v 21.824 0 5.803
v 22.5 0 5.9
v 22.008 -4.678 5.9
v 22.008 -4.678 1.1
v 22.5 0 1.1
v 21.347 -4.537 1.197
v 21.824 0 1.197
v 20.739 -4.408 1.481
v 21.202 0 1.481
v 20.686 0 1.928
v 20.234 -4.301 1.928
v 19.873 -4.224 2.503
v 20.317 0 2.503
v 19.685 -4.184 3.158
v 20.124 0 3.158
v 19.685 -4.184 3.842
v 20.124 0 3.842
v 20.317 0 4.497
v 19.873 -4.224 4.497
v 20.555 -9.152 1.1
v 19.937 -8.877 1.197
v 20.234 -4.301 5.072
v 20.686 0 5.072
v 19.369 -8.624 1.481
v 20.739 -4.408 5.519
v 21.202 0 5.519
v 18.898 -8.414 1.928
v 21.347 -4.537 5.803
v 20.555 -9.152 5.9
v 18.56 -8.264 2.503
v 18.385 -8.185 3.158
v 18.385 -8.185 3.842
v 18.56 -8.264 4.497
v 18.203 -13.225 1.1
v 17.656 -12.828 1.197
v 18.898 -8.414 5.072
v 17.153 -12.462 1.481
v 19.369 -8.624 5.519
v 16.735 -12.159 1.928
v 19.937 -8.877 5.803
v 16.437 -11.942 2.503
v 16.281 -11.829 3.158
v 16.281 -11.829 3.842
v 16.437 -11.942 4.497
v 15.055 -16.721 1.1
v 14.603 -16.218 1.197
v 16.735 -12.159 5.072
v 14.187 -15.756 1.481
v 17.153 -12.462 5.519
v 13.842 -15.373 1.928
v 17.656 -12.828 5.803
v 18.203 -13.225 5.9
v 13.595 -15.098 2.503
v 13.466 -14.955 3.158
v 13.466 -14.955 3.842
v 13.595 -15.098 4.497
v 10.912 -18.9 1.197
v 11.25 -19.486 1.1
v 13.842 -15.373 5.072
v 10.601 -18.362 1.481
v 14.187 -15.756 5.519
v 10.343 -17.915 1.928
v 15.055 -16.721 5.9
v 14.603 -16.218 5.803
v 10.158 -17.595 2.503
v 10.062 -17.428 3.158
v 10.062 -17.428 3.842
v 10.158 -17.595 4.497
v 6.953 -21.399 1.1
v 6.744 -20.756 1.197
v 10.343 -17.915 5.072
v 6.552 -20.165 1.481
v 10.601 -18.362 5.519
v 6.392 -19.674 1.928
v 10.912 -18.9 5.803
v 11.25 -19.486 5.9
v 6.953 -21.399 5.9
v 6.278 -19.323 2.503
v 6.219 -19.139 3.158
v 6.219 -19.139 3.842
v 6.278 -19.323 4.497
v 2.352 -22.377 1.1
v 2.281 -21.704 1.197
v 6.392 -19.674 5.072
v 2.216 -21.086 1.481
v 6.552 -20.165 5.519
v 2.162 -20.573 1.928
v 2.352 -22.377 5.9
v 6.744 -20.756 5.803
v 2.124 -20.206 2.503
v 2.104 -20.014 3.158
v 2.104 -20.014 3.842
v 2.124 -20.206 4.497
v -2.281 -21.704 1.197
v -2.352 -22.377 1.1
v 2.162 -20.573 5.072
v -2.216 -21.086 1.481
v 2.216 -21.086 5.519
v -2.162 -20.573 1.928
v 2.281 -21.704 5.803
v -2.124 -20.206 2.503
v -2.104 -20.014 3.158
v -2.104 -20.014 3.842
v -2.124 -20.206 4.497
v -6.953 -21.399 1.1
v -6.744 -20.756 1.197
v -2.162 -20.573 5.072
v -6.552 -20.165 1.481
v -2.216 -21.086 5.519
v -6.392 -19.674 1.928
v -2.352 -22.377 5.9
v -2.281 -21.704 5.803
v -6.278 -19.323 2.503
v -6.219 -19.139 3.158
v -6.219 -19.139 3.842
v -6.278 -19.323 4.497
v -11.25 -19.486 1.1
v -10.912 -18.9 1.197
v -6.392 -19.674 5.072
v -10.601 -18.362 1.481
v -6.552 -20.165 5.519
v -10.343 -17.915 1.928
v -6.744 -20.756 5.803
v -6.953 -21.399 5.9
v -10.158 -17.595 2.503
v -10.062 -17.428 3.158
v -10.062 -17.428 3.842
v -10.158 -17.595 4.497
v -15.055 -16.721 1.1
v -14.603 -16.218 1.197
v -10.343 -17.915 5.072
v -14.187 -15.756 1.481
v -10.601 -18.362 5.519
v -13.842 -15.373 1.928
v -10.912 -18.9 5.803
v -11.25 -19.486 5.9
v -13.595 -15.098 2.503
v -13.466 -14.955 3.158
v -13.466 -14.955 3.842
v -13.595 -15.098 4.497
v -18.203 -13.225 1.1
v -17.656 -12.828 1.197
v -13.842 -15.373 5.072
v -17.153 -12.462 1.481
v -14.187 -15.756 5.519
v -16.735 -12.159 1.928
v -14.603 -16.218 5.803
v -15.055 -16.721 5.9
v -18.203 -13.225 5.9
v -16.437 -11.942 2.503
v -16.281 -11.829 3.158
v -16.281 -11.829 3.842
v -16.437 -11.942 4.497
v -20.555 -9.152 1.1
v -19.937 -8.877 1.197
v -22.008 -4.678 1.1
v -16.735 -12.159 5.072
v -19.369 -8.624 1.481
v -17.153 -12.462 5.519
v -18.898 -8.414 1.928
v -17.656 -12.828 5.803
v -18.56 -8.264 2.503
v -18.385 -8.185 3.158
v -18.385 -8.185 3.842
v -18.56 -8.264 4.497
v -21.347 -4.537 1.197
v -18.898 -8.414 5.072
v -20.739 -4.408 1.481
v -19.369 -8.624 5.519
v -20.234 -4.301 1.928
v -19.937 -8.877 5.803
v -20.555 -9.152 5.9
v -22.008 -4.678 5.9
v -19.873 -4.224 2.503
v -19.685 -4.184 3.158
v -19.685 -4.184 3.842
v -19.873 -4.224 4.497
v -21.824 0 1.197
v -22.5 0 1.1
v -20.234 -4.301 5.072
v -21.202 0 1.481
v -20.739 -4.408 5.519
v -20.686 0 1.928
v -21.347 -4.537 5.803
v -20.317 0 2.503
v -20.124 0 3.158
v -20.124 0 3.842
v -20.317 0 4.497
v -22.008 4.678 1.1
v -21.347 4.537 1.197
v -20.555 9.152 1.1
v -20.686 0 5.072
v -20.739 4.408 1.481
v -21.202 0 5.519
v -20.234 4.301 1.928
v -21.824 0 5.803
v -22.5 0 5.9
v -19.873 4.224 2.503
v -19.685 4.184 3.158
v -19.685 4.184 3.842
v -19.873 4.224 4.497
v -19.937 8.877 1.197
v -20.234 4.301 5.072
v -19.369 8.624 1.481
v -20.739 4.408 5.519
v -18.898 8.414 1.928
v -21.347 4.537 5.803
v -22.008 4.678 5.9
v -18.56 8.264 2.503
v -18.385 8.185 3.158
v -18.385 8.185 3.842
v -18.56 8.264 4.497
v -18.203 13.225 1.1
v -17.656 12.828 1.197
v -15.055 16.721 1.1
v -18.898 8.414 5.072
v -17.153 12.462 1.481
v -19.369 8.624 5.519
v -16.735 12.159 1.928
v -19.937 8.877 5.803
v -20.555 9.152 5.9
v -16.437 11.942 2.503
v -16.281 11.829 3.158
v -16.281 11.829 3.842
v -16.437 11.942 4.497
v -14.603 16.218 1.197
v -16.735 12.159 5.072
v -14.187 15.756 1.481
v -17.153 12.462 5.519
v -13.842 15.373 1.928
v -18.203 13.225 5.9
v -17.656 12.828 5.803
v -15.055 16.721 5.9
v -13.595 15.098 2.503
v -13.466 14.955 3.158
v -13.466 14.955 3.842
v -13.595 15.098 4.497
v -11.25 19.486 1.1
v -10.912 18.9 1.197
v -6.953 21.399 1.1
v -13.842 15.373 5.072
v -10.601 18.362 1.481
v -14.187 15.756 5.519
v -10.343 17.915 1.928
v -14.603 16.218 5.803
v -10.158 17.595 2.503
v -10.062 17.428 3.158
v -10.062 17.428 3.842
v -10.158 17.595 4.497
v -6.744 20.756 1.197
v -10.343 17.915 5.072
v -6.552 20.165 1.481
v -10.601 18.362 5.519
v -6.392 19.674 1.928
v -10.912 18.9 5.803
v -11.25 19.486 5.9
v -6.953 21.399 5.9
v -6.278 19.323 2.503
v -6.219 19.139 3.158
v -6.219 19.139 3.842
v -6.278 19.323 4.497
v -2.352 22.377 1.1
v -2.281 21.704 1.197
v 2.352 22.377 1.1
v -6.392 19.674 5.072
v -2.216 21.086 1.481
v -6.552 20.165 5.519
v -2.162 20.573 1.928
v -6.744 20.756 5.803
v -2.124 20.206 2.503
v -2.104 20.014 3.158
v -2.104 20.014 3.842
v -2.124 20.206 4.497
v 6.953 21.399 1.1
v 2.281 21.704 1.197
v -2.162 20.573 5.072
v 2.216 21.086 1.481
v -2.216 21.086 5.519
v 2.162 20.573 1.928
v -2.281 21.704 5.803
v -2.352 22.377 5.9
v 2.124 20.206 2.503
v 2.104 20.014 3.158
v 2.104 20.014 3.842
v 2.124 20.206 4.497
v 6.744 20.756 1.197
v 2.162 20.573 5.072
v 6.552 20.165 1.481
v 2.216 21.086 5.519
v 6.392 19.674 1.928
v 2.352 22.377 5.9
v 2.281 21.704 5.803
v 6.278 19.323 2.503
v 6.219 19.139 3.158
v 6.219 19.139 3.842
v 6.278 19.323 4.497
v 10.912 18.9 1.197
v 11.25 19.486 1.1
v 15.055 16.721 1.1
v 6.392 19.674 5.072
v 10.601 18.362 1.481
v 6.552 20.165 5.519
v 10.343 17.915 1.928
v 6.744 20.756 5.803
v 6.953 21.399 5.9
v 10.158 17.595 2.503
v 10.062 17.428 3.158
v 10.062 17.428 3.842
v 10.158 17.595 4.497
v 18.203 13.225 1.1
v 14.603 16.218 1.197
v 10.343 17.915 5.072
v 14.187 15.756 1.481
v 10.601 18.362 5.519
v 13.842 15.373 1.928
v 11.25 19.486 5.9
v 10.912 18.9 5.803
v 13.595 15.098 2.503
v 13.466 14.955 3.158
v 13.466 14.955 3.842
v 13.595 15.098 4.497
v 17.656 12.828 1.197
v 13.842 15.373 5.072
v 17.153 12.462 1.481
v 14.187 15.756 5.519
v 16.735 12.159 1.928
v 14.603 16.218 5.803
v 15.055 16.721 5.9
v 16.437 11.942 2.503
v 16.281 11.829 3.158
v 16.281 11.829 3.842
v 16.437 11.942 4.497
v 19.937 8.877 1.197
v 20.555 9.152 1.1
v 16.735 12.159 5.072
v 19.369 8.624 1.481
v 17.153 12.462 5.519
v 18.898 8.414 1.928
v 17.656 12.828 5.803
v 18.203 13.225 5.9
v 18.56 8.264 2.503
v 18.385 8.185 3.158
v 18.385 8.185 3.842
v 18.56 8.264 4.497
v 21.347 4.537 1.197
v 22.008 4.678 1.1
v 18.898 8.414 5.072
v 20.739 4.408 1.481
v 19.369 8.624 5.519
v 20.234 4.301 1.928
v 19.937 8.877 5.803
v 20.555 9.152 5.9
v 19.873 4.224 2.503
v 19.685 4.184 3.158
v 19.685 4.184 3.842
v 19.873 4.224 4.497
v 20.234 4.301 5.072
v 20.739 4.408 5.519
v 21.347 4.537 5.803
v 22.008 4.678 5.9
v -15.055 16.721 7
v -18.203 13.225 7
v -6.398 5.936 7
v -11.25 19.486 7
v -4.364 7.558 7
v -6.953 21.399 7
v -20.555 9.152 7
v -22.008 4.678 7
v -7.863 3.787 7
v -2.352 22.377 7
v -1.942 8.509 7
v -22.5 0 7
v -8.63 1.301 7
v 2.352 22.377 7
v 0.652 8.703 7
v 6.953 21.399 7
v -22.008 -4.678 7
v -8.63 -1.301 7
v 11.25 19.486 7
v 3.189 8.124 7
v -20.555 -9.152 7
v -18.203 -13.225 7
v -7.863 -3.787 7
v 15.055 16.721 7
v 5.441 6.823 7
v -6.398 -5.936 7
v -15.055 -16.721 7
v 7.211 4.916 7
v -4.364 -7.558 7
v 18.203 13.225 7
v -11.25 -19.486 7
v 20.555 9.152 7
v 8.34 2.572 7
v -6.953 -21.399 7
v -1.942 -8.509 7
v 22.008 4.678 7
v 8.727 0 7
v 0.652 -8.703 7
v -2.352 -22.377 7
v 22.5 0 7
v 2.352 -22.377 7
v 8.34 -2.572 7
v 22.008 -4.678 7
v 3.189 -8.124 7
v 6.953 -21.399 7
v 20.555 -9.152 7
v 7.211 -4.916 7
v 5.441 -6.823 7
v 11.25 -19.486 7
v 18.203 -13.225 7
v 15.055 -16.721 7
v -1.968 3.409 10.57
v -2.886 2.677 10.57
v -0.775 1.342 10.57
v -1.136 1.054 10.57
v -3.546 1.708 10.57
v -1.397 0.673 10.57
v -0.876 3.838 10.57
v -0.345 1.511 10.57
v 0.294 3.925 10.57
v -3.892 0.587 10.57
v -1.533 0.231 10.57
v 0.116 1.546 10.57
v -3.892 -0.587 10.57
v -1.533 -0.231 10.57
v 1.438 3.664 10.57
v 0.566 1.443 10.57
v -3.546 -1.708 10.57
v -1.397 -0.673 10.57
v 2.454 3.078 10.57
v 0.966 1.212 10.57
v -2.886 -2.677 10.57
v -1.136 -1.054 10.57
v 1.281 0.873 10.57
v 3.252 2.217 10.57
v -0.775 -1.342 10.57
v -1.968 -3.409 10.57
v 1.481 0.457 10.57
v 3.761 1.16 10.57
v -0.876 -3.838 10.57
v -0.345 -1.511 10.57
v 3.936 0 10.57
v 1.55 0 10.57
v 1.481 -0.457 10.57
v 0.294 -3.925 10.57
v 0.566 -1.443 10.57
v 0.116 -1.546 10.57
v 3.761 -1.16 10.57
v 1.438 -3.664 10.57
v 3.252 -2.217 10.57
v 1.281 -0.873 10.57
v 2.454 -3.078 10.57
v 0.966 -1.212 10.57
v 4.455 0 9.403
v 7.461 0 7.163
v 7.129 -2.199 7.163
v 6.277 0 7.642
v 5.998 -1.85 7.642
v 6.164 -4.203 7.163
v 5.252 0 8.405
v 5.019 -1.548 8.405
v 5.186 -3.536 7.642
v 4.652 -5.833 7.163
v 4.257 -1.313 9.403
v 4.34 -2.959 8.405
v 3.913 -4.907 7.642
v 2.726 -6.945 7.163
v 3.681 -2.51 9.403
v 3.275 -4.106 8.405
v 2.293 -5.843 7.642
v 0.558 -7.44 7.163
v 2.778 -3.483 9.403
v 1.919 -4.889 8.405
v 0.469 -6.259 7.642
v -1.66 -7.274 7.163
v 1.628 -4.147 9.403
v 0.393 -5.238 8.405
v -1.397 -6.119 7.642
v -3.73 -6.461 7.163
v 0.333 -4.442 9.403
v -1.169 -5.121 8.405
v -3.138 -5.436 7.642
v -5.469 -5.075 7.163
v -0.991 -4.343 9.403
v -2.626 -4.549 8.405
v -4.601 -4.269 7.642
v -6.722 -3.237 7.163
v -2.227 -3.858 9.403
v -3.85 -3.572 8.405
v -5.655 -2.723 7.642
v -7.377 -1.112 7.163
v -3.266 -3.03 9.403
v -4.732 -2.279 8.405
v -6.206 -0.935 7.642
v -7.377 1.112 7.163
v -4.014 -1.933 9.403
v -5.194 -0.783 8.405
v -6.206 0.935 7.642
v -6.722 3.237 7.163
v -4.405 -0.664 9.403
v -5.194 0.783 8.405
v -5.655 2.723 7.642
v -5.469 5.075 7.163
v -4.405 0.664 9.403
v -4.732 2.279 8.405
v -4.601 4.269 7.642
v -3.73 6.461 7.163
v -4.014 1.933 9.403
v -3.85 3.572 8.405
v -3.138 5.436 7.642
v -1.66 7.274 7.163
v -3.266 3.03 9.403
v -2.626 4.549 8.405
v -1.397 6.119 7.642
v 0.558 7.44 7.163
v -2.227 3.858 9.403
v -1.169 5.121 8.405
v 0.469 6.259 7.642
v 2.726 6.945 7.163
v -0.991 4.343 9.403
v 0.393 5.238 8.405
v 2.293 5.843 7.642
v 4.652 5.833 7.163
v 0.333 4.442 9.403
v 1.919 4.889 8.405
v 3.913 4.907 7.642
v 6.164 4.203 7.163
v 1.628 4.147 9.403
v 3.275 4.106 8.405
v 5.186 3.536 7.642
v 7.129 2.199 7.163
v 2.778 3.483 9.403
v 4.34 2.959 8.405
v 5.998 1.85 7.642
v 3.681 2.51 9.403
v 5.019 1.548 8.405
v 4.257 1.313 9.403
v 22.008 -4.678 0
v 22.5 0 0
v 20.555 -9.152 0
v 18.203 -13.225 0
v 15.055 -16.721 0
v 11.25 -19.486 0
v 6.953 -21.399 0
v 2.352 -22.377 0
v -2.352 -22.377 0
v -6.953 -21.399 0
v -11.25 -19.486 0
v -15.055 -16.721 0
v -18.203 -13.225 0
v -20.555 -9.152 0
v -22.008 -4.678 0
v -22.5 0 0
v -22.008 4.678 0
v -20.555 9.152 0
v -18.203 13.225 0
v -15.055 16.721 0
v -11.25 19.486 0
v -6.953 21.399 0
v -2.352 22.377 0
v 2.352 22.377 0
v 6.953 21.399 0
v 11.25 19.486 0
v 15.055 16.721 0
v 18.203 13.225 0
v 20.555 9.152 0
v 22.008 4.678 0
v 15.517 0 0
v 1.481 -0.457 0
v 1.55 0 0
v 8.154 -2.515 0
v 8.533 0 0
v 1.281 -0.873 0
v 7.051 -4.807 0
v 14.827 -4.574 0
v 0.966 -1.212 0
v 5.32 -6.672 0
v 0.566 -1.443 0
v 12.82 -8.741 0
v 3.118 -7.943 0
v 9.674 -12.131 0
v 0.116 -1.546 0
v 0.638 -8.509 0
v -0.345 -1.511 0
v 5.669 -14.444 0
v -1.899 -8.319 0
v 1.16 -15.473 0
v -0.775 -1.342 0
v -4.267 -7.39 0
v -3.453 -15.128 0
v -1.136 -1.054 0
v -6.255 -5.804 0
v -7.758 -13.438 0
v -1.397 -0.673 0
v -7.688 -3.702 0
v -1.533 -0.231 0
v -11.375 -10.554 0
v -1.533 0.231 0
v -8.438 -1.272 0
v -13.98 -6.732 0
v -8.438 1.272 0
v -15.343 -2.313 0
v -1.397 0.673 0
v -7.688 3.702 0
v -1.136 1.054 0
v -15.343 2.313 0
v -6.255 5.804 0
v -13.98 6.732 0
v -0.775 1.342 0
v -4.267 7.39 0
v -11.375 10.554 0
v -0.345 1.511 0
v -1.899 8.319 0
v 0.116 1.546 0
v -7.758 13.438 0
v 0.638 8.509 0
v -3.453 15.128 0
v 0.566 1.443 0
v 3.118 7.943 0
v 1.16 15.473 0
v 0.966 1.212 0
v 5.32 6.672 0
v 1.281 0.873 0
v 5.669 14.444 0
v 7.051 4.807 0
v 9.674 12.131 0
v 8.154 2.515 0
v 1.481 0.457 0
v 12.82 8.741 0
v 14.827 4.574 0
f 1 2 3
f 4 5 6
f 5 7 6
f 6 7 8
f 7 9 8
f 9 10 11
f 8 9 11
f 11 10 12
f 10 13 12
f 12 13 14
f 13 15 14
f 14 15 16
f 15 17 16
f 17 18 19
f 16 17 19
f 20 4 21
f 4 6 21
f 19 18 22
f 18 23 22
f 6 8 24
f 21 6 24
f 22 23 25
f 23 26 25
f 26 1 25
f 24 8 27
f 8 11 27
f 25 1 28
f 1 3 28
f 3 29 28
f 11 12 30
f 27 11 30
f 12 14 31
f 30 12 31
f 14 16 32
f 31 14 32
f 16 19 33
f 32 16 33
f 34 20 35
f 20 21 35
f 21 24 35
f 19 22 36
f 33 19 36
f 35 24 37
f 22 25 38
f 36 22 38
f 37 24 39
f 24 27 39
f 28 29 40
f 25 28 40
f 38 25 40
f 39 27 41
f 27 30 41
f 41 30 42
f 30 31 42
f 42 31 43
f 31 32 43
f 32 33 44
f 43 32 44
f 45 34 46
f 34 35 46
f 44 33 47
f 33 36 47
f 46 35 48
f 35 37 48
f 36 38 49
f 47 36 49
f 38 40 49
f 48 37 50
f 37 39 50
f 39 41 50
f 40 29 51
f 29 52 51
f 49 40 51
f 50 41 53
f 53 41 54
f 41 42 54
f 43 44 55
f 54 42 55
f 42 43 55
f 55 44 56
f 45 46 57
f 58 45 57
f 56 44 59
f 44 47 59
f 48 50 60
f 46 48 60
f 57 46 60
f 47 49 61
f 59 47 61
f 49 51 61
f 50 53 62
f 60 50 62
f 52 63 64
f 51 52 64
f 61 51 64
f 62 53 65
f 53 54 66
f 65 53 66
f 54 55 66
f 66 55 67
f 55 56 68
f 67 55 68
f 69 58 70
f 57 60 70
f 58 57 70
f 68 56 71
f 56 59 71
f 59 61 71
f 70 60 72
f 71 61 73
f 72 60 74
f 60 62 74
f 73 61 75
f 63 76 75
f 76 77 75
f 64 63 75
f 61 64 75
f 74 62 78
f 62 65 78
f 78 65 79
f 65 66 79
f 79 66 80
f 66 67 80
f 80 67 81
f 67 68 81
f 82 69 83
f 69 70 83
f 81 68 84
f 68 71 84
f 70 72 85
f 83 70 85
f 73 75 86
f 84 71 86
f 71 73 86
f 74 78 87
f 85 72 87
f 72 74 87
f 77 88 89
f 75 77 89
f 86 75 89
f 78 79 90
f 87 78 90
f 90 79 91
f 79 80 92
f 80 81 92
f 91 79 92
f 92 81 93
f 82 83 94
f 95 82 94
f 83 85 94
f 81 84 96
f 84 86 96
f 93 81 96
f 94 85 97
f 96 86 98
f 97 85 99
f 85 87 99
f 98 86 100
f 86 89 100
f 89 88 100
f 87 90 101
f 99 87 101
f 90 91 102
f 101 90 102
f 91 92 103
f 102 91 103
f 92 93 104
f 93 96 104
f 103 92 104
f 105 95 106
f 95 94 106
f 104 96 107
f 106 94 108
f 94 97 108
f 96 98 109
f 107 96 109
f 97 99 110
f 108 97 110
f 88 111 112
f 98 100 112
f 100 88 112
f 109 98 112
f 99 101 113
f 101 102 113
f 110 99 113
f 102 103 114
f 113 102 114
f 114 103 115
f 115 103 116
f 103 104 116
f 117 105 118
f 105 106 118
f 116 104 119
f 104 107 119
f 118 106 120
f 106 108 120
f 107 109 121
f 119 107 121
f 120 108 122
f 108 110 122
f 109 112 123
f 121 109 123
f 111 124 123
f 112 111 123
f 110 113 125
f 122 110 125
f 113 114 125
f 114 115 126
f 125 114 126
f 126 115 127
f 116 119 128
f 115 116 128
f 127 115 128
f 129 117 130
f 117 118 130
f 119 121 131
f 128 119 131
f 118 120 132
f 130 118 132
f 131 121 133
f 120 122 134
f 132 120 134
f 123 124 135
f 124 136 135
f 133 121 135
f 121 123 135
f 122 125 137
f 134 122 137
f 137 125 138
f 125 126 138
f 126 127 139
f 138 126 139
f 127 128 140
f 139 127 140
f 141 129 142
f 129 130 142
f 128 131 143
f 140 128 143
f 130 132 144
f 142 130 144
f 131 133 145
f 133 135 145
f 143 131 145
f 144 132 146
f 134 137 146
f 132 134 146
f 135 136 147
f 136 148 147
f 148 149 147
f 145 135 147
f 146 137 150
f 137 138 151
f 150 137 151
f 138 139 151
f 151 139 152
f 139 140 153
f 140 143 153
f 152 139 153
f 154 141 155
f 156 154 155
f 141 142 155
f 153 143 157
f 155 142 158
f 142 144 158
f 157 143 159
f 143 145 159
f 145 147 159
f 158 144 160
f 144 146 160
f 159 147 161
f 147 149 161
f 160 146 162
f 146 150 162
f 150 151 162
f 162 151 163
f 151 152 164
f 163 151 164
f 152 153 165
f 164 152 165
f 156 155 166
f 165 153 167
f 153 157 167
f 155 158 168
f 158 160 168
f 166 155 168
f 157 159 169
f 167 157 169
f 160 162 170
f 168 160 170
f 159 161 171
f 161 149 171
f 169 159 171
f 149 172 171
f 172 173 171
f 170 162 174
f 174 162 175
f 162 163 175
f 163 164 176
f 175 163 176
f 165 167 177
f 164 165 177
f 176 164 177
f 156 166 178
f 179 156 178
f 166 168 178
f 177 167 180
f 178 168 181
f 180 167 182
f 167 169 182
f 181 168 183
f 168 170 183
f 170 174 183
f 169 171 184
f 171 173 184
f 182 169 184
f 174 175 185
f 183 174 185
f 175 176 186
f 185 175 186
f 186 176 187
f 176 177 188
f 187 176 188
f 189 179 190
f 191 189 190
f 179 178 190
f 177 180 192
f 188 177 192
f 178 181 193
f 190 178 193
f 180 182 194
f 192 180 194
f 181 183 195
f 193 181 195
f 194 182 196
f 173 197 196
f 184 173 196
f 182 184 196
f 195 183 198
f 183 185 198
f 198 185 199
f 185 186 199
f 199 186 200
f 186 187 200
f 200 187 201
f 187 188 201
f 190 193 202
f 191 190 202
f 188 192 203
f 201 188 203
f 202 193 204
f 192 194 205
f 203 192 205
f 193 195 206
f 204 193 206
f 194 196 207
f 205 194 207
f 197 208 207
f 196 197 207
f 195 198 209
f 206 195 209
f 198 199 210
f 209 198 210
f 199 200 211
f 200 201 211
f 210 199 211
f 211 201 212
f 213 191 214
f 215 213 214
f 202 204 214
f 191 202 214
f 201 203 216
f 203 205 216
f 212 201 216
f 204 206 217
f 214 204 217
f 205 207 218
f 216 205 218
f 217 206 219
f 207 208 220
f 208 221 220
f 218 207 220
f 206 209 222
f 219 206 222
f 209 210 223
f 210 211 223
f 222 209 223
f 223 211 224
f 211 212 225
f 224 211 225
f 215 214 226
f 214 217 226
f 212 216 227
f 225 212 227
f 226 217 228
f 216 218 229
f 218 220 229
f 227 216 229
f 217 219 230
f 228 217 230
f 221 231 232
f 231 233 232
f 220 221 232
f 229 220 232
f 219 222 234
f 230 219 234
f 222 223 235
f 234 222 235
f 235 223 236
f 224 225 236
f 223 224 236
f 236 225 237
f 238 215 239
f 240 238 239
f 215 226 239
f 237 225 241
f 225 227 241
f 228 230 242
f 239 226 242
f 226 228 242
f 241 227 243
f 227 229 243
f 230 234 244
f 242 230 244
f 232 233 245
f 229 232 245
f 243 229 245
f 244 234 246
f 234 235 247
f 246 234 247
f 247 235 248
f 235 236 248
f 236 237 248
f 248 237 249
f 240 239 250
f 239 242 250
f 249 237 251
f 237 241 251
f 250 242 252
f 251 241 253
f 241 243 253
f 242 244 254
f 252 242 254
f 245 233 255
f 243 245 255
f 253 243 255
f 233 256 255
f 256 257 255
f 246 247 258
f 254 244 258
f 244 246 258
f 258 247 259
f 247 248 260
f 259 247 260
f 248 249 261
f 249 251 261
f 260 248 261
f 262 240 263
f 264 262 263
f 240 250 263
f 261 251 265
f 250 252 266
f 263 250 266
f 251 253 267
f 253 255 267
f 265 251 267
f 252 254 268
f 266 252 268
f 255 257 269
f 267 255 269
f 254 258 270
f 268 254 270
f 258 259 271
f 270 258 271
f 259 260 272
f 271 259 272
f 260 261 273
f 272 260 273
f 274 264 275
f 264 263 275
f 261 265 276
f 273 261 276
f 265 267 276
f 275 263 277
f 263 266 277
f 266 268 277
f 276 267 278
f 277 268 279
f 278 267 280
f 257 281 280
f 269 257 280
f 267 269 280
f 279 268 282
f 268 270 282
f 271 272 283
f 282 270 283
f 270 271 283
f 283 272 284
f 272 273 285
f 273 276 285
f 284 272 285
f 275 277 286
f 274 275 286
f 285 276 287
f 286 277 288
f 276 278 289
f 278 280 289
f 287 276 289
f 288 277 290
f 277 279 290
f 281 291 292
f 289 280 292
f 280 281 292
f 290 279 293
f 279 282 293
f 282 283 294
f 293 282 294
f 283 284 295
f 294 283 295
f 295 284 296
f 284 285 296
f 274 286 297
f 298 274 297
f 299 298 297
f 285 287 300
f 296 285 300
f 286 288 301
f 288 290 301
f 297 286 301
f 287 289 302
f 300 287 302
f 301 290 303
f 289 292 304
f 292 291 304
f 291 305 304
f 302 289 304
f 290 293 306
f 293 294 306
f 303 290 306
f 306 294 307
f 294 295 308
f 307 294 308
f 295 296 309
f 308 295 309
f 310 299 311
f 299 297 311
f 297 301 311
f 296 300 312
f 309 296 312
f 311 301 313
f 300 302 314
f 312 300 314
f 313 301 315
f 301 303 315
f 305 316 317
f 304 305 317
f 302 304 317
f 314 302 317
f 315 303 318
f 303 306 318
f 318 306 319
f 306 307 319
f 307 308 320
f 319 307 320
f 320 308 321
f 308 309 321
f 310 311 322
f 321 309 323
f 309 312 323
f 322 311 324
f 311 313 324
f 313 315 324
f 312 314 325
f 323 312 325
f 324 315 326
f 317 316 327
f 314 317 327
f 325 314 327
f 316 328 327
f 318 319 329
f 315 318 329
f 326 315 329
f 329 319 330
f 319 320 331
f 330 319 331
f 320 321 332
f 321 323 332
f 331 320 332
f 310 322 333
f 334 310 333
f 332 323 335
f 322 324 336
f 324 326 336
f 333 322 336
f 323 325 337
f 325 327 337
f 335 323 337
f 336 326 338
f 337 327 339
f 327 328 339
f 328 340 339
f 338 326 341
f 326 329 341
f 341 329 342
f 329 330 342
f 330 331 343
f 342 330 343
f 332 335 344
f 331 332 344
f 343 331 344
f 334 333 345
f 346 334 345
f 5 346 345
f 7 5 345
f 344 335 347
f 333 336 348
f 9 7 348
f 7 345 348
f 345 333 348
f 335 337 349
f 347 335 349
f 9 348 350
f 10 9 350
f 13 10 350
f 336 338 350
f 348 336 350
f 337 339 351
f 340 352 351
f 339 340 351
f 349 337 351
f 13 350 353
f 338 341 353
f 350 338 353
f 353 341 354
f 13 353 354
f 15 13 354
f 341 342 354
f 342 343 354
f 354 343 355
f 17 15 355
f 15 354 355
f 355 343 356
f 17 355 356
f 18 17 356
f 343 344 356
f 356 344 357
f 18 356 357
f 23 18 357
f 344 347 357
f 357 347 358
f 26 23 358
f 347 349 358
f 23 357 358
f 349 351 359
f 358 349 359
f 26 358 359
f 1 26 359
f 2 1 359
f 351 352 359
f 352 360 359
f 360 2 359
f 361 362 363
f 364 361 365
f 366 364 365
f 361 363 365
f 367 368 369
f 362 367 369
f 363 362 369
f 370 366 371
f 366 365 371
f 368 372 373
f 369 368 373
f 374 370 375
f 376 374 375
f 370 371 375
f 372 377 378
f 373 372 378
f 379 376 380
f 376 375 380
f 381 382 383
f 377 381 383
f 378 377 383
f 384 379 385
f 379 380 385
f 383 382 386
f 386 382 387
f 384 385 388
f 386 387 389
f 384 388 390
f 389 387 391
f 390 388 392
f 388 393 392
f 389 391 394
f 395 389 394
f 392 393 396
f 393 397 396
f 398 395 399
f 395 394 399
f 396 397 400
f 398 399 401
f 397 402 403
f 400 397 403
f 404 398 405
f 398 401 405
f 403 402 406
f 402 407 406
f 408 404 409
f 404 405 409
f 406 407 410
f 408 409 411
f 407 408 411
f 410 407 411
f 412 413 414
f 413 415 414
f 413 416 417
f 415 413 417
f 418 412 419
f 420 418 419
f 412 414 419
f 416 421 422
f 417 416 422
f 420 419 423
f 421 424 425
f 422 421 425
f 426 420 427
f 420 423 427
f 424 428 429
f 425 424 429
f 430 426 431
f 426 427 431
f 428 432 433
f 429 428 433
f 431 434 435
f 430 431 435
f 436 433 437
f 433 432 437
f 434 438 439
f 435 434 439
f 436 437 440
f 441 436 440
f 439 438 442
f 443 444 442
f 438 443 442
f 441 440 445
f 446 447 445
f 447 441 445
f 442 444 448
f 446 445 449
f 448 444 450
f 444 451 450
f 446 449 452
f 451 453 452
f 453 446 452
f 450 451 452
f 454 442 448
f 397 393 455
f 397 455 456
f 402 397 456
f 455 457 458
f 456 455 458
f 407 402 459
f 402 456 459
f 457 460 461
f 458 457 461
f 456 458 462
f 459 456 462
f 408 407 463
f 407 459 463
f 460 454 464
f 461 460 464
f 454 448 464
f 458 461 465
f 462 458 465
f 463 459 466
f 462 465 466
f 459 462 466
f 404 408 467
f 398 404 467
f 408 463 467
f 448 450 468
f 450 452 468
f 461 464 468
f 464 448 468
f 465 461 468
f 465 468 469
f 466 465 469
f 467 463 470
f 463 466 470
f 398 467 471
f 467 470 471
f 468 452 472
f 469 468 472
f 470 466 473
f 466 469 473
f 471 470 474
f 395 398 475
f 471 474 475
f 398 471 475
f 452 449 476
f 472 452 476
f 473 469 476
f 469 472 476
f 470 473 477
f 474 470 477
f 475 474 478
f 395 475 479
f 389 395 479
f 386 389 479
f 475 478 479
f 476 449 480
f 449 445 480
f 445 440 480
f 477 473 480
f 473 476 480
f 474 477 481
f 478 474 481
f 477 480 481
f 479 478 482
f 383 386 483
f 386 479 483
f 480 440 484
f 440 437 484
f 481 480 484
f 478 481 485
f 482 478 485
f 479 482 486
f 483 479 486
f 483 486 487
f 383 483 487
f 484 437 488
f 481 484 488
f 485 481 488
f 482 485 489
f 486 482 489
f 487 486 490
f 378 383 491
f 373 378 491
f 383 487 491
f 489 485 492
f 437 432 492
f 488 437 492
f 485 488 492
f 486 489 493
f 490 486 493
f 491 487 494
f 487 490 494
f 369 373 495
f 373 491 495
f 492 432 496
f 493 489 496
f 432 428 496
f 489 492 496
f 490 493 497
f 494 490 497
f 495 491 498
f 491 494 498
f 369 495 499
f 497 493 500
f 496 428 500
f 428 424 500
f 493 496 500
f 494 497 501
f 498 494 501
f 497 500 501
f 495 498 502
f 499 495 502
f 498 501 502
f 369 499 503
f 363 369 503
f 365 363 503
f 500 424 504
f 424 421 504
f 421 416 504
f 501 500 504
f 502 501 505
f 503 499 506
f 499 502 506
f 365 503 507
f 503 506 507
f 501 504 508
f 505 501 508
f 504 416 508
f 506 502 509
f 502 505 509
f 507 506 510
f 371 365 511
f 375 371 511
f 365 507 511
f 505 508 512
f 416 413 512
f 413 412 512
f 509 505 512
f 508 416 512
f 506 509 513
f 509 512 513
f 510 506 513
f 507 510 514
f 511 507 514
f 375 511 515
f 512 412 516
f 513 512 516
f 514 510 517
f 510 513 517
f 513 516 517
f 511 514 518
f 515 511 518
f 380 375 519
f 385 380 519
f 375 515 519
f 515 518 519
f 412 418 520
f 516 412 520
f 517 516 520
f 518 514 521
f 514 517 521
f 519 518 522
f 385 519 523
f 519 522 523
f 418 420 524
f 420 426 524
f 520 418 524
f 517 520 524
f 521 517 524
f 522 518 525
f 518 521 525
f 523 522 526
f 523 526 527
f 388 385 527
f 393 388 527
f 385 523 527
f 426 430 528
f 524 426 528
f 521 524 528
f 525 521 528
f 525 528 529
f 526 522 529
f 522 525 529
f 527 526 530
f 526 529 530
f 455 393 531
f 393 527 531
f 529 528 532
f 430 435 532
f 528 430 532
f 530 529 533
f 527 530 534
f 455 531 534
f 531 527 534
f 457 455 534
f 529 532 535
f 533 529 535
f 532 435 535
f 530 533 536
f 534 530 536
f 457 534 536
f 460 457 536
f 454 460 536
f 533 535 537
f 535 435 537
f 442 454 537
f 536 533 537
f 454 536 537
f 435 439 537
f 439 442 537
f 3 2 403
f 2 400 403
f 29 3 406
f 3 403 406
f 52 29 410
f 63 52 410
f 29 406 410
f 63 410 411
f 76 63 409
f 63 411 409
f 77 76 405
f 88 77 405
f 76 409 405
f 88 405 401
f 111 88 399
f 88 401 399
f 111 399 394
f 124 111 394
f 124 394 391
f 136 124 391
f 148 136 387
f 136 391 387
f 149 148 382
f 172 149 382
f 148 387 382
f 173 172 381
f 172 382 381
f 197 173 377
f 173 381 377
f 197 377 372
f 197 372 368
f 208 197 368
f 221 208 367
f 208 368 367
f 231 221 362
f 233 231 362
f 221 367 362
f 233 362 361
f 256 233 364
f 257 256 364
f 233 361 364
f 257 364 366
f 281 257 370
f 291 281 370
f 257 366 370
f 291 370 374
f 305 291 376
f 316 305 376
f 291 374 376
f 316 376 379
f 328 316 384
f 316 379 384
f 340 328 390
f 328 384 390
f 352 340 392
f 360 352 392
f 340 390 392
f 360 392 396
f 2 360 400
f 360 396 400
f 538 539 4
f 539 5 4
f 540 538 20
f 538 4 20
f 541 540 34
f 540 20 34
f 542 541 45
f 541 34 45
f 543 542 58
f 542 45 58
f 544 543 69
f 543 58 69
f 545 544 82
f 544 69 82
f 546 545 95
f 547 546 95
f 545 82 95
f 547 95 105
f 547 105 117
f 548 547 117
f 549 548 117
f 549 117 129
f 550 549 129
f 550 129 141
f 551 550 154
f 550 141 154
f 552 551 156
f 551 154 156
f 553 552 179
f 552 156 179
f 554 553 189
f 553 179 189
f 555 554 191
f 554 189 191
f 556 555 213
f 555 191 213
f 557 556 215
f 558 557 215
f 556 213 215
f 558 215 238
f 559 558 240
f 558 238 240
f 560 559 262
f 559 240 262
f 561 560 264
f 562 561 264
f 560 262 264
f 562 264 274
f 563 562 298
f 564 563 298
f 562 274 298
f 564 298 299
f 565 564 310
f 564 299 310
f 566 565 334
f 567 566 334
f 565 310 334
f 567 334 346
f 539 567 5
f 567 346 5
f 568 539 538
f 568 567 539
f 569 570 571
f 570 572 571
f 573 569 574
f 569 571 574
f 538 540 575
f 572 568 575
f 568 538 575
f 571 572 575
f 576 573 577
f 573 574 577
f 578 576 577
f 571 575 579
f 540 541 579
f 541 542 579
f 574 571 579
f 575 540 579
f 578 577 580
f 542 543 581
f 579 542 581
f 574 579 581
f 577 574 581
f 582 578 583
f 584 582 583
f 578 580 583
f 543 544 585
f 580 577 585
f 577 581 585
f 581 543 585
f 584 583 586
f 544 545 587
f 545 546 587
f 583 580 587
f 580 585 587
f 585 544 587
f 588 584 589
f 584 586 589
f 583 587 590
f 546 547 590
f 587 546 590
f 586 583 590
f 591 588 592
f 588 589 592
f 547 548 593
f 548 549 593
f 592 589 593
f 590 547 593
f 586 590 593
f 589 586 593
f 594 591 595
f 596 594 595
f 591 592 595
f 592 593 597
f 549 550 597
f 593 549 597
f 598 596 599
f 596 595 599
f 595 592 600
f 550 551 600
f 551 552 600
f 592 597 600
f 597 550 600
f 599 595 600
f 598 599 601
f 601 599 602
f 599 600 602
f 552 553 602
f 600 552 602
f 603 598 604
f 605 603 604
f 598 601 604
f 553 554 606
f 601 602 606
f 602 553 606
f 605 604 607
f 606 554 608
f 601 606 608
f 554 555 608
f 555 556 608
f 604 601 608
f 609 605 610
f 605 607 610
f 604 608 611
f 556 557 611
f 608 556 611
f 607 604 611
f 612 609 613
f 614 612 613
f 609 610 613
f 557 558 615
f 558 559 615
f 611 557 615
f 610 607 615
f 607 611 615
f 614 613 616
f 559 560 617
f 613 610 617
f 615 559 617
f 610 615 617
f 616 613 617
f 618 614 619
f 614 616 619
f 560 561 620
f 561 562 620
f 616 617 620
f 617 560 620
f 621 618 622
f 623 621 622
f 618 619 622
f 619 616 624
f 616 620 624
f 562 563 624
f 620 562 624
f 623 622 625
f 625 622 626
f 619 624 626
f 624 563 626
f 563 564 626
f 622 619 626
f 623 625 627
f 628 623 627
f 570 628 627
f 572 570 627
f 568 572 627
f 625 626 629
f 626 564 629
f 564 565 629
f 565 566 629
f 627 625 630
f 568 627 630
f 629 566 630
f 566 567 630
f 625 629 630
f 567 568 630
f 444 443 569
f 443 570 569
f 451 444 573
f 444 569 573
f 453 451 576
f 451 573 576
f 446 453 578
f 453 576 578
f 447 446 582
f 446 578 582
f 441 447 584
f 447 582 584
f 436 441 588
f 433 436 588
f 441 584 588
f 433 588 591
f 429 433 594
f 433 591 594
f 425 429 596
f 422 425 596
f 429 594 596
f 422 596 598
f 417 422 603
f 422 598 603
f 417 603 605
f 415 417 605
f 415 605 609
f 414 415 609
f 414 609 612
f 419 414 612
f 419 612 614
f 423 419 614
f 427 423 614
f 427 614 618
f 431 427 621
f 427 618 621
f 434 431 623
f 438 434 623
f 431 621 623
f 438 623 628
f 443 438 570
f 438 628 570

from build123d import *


# Not quite as in the source:
# - a fillet or chamfer that OpenCascade refuses, or shapes differently, is made with other operations: its cross-section is extruded or revolved along the edge and cut away or added
# - ends of sketch curves that miss each other by under 0.0002 mm in the source are joined


with BuildPart() as f1:
    # F0 (on Front) → F1 (revolve)
    with BuildSketch(Plane.XZ):
        with BuildLine():
            Line((1.55, 10.5700949207), (1.55, 4.9207e-06))
            Line((1.55, 4.9207e-06), (22.5, 0))
            Line((22.5, 0), (22.5, 1.1))
            ThreePointArc((22.5, 1.1), (20.1, 3.5), (22.5, 5.9))
            Line((22.5, 5.9), (22.5, 7))
            Line((22.5, 7), (3.9362940006, 7))
            Line((3.9362940006, 7), (3.9362940006, 10.5700949207))
            Line((3.9362940006, 10.5700949207), (1.55, 10.5700949207))
        make_face()
    revolve(axis=Axis((0, 0, 5.2850474603), (0, 0, -1)))

    # F2: fillet of radius 5 on 1 edges, made by hand

    # F2_s1 → F2_t2 (revolve)
    with BuildSketch(Plane.XZ):
        with BuildLine():
            ThreePointArc((8.7274704182, 7), (5.739956853, 7.9906655542), (3.9362940006, 10.5700949207))
            Line((3.9362940006, 10.5700949207), (3.9362940006, 7))
            Line((3.9362940006, 7), (8.7274704182, 7))
        make_face()
    revolve(axis=Axis((0, 0, 7), (0, 0, -1)))


solid = f1.part
